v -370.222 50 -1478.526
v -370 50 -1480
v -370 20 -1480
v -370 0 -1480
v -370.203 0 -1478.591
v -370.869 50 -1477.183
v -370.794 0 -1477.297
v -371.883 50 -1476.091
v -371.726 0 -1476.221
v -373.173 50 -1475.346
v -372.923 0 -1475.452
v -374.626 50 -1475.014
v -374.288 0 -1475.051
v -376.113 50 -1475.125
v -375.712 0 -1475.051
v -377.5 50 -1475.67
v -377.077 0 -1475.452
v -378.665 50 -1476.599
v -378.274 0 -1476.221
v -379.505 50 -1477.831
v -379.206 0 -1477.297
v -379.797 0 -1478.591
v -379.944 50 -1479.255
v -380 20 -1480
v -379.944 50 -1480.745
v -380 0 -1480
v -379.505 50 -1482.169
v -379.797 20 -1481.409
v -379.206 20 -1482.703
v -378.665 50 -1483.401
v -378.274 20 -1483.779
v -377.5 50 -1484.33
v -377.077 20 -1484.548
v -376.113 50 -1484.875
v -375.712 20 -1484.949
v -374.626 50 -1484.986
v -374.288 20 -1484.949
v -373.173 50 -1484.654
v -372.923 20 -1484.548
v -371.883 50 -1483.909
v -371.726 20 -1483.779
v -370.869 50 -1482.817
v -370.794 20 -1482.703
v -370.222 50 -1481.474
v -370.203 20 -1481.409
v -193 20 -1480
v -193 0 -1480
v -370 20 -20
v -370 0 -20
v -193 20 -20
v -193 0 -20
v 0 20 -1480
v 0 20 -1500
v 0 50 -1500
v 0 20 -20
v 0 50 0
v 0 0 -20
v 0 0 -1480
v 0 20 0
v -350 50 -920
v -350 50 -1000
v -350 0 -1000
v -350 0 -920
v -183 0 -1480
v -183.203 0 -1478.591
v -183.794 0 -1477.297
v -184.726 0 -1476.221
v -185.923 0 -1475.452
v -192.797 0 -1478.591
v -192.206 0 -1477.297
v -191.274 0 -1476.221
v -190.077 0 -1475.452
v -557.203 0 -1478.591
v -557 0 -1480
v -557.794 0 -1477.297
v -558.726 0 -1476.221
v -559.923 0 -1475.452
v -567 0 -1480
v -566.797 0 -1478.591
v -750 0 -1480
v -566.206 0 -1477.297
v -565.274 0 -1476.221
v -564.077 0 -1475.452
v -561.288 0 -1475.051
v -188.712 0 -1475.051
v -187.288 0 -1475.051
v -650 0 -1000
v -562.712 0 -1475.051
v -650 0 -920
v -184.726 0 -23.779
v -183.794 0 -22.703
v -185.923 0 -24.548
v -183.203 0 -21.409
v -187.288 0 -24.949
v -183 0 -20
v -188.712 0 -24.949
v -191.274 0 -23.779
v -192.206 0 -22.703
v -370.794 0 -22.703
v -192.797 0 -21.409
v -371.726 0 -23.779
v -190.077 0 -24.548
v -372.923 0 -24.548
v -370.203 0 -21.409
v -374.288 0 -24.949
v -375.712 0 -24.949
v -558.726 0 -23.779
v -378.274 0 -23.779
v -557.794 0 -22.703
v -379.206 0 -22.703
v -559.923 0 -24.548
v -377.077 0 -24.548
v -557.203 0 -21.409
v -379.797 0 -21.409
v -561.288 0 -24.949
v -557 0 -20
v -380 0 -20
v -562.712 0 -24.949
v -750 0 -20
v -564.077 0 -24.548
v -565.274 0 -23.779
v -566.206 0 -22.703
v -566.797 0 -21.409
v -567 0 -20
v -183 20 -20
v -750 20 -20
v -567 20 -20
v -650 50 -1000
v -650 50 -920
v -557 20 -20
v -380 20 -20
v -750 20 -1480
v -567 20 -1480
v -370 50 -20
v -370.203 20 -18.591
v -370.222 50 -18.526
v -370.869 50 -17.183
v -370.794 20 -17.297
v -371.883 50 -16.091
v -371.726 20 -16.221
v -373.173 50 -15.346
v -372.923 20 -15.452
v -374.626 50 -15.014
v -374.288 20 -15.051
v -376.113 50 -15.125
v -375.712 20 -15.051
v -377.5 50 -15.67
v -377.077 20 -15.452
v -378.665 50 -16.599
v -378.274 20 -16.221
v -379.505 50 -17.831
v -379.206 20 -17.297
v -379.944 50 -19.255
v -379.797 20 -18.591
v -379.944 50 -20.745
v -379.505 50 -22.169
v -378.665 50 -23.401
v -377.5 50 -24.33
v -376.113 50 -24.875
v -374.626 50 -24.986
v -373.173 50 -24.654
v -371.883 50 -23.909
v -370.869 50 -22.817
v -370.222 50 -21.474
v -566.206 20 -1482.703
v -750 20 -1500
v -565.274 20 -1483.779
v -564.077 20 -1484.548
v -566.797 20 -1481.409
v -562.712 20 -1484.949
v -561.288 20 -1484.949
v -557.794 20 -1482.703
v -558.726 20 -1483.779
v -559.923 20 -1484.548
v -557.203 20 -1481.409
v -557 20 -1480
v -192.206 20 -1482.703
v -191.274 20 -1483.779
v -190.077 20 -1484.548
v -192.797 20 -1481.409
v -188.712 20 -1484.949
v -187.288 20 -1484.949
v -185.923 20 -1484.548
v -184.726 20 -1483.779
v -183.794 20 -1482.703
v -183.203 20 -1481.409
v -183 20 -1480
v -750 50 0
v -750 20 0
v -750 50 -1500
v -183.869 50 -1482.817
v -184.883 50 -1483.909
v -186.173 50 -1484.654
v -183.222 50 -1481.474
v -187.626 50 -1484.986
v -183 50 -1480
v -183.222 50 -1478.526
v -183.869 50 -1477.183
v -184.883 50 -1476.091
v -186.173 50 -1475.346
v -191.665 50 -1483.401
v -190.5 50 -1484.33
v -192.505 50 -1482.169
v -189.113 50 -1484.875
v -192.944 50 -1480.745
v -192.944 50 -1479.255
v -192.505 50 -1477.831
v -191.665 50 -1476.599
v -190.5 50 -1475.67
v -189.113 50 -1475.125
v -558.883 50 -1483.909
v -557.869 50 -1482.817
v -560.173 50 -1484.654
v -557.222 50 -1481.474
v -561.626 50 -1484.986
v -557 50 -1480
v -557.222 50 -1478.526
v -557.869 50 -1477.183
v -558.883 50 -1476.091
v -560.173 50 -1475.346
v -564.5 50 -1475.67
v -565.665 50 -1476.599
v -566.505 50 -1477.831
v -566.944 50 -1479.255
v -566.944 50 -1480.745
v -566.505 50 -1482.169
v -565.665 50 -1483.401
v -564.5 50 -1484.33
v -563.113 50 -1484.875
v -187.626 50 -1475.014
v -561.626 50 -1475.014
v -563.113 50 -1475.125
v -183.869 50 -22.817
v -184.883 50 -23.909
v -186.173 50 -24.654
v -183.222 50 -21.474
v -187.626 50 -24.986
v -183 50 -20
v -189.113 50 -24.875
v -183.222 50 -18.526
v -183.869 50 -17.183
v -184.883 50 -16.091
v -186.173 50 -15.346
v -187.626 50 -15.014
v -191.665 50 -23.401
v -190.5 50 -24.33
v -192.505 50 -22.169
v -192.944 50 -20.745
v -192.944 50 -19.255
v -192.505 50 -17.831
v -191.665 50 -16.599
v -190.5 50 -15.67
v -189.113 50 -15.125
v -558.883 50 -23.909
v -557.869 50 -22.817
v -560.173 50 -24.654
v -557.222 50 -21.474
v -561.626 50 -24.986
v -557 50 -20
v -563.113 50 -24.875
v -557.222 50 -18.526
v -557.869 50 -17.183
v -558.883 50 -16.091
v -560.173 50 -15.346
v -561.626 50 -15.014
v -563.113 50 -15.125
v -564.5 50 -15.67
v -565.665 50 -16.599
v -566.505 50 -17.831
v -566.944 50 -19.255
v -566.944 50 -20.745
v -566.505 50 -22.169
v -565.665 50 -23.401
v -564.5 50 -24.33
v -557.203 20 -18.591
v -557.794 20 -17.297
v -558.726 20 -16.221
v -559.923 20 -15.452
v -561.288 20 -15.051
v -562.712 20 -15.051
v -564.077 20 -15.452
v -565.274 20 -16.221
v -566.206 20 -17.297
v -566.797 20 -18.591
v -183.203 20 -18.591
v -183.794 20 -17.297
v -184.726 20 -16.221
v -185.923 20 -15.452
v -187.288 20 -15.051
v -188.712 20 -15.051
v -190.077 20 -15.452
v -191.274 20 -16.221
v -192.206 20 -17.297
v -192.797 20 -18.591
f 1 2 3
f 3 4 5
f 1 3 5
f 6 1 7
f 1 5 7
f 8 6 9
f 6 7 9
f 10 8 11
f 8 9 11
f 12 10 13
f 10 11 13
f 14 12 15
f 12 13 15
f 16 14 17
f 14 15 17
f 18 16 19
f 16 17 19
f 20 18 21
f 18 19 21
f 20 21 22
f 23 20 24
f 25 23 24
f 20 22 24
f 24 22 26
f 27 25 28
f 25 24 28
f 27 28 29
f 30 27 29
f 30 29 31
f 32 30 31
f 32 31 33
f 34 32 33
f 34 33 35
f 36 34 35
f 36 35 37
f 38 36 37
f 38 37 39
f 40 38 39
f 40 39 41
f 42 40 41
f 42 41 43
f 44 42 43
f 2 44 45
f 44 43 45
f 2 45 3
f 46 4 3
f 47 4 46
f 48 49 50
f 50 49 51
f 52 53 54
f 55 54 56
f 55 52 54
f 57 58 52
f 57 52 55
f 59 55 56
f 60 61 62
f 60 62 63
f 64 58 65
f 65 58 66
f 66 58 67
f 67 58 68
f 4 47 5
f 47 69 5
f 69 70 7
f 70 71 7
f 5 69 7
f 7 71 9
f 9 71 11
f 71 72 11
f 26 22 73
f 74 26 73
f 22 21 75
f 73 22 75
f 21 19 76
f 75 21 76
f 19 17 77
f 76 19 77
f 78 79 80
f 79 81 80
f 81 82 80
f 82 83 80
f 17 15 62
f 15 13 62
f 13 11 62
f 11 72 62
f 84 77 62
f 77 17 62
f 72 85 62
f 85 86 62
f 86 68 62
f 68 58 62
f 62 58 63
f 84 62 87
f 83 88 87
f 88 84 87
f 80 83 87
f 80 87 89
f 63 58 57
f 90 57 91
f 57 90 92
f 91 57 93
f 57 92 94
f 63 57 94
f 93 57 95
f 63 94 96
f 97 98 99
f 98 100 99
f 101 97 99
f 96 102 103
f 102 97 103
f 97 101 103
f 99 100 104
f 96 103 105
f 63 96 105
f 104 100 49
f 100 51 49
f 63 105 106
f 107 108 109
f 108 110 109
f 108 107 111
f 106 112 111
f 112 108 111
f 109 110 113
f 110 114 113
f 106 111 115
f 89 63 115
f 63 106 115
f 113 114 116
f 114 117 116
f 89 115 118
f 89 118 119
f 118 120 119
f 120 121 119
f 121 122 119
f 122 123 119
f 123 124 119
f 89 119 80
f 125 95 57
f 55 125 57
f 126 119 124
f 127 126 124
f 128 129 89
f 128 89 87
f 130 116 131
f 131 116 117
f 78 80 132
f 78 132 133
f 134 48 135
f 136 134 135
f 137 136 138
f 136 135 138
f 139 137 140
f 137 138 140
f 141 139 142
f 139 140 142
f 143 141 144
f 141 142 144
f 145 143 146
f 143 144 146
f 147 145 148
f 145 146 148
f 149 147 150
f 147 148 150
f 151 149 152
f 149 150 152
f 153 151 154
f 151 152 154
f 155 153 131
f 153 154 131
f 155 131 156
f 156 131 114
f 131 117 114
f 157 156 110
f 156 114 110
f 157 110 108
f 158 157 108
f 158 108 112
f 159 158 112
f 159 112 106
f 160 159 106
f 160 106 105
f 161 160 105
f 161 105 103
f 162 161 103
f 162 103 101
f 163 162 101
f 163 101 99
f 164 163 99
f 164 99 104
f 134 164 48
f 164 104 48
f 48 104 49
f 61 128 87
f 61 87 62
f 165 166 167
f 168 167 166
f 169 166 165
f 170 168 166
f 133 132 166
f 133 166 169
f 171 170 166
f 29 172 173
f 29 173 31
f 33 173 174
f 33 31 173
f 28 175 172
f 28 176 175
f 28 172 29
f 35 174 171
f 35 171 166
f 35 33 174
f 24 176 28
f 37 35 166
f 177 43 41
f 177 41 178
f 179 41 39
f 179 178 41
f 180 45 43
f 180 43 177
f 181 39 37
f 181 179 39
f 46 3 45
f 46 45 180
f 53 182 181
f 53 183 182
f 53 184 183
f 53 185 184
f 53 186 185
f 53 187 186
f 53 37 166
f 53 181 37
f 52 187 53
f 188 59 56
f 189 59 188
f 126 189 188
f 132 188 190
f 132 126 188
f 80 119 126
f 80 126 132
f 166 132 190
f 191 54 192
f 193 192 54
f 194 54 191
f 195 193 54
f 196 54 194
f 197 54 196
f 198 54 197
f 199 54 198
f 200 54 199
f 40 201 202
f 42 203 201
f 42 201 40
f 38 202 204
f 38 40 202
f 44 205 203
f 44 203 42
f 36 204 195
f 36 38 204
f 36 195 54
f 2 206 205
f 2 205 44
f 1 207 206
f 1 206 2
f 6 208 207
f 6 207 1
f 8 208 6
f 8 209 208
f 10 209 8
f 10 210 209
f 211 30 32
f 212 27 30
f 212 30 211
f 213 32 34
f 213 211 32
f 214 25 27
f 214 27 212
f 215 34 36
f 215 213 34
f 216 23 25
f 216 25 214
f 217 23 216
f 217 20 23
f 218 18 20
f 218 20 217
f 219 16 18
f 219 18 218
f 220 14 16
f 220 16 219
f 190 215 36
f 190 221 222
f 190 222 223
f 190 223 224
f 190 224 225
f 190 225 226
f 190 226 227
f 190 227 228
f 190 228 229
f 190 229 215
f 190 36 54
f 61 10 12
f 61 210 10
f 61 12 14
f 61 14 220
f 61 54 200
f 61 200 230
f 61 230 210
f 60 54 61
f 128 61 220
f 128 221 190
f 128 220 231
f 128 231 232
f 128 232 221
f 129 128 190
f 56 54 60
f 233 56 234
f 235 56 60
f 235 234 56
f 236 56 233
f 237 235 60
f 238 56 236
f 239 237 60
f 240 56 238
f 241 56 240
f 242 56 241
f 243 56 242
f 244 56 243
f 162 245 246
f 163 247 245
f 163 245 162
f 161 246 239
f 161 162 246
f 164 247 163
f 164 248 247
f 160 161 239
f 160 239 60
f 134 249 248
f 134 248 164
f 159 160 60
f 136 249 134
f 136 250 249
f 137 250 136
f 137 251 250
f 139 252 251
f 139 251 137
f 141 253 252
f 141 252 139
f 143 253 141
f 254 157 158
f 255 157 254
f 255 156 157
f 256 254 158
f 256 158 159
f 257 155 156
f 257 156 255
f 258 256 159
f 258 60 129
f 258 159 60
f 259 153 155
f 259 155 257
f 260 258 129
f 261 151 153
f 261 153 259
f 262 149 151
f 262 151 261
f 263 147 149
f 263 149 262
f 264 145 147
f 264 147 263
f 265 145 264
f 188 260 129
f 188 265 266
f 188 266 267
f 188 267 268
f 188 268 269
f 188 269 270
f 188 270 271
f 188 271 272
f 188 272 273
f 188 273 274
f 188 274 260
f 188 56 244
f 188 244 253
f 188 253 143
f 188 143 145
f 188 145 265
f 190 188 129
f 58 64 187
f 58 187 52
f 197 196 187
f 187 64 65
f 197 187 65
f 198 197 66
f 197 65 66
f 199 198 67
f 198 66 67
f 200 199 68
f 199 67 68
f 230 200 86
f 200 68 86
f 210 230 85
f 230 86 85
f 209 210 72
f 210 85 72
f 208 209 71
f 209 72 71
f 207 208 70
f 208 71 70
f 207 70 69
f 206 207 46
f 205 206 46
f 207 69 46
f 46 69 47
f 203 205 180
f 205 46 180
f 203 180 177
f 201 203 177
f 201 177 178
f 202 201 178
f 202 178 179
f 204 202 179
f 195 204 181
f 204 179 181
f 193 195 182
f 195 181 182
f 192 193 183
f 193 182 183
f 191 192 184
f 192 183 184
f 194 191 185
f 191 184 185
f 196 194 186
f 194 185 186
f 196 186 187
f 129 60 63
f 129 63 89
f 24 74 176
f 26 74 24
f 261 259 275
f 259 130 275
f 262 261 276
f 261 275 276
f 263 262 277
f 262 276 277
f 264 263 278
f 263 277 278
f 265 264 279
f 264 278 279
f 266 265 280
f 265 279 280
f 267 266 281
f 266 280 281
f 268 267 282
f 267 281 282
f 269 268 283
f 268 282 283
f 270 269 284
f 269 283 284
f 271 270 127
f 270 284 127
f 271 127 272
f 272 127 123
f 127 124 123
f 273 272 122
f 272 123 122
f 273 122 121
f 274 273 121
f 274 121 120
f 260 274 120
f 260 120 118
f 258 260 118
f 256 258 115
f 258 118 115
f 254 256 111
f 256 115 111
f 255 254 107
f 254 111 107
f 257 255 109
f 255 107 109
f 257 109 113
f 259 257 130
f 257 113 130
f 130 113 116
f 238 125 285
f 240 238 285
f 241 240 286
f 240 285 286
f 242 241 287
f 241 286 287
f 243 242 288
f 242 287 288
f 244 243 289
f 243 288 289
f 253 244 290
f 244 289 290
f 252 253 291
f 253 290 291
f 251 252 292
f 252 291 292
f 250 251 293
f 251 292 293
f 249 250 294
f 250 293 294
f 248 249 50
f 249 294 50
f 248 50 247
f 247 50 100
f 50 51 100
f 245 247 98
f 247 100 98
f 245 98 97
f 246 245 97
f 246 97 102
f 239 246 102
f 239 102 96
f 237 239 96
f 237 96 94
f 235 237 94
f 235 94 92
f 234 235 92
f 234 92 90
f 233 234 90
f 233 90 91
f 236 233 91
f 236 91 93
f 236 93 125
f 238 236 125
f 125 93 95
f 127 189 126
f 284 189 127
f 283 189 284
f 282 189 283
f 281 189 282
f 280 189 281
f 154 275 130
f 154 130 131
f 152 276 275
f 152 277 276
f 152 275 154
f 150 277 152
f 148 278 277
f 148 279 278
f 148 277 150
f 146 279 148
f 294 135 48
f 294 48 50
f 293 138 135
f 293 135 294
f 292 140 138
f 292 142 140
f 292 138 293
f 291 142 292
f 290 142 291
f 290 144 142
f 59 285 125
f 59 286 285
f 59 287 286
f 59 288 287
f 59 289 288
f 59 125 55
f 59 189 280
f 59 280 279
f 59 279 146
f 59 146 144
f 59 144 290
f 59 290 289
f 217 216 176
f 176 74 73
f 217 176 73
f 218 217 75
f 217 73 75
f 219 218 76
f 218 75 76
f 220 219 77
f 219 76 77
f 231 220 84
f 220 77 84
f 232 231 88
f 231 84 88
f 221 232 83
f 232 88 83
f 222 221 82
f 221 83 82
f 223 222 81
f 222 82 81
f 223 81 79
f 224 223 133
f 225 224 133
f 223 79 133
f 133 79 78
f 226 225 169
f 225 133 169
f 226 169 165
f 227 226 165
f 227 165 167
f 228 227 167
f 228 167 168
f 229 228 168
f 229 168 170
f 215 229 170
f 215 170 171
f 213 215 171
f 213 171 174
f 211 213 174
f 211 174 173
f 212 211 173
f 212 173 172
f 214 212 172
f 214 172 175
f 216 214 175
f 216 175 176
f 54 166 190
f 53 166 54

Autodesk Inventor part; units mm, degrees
ref_plane "YZ Plane" through (0, 0, 0) normal (1, 0, 0) x (0, 1, 0)
ref_plane "XZ Plane" through (0, 0, 0) normal (0, 1, 0) x (-1, 0, 0)
ref_plane "XY Plane" through (0, 0, 0) normal (0, 0, 1) x (1, 0, 0)
sketch "Sketch1" plane through (0, 0, 0) normal (0, 1, 0) x (-1, 0, 0)
  line L0 (0, 0) -> (750, 0)
  line L1 (750, 0) -> (750, -1500)
  line L2 (750, -1500) -> (0, -1500)
  line L3 (0, -1500) -> (0, 0)
  line L4 (750, -1500) -> (750, -1480)
  line L5 (750, -1480) -> (0, -1480)
  line L6 (0, -1500) -> (750, -1500)
  line L7 (0, 0) -> (0, -20)
  line L8 (0, -20) -> (750, -20)
  line L9 (750, 0) -> (0, 0)
  dimension "d2" = 750
  dimension "d3" = 1500
  dimension "d6" = 20
  dimension "d7" = 20
extrude "Extrusion1" add sketch "Sketch1" along normal blind 50
sketch "Sketch2" plane through (0, 0, 0) normal (0, -1, 0) x (1, 0, 0)
  line L0 (0, 0) -> (0, -1500) projected
  line L1 (-750, -1500) -> (-750, 0) projected
  line L2 (0, 0) -> (-750, 0)
  line L3 (-750, 0) -> (-750, -20)
  line L4 (-750, -20) -> (0, -20)
  line L5 (0, -20) -> (0, 0)
  line L6 (0, -1500) -> (-750, -1500)
  line L7 (-750, -1500) -> (-750, -1480)
  line L8 (-750, -1480) -> (0, -1480)
  line L9 (0, -1480) -> (0, -1500)
  dimension "d8" = 20
  dimension "d9" = 20
extrude "Extrusion2" cut sketch "Sketch2" against normal blind 20 contours L0 L4 L1 L2 | L0 L6 L1 L8
sketch "Sketch3" plane through (0, 0, 0) normal (0, -1, 0) x (1, 0, 0)
  line L0 (0, -20) -> (0, -1480) projected
  circle A0 centre (-562, -20) radius 5
  circle A1 centre (-375, -20) radius 5
  circle A2 centre (-188, -20) radius 5
  line L1 (-750, -1480) -> (0, -1480) projected
  line L2 (-188, -20) -> (1272, -20) construction
  line L3 (-375, -20) -> (1085, -20) construction
  line L4 (0, -20) -> (-750, -20) projected
  line L5 (-562, -20) -> (898, -20) construction
  circle A3 centre (-562, -1480) radius 5
  circle A4 centre (-375, -1480) radius 5
  circle A5 centre (-188, -1480) radius 5
  point P0 (0, 0)
  dimension "d15" = 10
  dimension "d16" = 10
  dimension "d17" = 10
  dimension "d24" = 10
  dimension "d25" = 10
  dimension "d26" = 10
extrude "Extrusion3" cut sketch "Sketch3" against normal blind 61.275
thread "Thread1" size "M10x1.5" class "6H" standard "ANSI Metric M Profile" full length
thread "Thread2" size "M10x1.5" class "6H" standard "ANSI Metric M Profile" full length
thread "Thread3" size "M10x1.5" class "6H" standard "ANSI Metric M Profile" full length
thread "Thread4" size "M10x1.5" class "6H" standard "ANSI Metric M Profile" full length
thread "Thread5" size "M10x1.5" class "6H" standard "ANSI Metric M Profile" full length
thread "Thread6" size "M10x1.5" class "6H" standard "ANSI Metric M Profile" full length
sketch "Sketch4" plane through (0, 50, 0) normal (0, 1, 0) x (1, 0, 0)
  line L0 (-650, 1000) -> (-350, 1000)
  line L1 (-350, 1000) -> (-350, 920)
  line L2 (-350, 920) -> (-650, 920)
  line L3 (-650, 920) -> (-650, 1000)
  point P0 (0, 0)
  point P1 (-750, 1500)
  dimension "d47" = 300
  dimension "d48" = 80
extrude "Extrusion4" cut sketch "Sketch4" against normal blind 220.025
properties part number "bench"
